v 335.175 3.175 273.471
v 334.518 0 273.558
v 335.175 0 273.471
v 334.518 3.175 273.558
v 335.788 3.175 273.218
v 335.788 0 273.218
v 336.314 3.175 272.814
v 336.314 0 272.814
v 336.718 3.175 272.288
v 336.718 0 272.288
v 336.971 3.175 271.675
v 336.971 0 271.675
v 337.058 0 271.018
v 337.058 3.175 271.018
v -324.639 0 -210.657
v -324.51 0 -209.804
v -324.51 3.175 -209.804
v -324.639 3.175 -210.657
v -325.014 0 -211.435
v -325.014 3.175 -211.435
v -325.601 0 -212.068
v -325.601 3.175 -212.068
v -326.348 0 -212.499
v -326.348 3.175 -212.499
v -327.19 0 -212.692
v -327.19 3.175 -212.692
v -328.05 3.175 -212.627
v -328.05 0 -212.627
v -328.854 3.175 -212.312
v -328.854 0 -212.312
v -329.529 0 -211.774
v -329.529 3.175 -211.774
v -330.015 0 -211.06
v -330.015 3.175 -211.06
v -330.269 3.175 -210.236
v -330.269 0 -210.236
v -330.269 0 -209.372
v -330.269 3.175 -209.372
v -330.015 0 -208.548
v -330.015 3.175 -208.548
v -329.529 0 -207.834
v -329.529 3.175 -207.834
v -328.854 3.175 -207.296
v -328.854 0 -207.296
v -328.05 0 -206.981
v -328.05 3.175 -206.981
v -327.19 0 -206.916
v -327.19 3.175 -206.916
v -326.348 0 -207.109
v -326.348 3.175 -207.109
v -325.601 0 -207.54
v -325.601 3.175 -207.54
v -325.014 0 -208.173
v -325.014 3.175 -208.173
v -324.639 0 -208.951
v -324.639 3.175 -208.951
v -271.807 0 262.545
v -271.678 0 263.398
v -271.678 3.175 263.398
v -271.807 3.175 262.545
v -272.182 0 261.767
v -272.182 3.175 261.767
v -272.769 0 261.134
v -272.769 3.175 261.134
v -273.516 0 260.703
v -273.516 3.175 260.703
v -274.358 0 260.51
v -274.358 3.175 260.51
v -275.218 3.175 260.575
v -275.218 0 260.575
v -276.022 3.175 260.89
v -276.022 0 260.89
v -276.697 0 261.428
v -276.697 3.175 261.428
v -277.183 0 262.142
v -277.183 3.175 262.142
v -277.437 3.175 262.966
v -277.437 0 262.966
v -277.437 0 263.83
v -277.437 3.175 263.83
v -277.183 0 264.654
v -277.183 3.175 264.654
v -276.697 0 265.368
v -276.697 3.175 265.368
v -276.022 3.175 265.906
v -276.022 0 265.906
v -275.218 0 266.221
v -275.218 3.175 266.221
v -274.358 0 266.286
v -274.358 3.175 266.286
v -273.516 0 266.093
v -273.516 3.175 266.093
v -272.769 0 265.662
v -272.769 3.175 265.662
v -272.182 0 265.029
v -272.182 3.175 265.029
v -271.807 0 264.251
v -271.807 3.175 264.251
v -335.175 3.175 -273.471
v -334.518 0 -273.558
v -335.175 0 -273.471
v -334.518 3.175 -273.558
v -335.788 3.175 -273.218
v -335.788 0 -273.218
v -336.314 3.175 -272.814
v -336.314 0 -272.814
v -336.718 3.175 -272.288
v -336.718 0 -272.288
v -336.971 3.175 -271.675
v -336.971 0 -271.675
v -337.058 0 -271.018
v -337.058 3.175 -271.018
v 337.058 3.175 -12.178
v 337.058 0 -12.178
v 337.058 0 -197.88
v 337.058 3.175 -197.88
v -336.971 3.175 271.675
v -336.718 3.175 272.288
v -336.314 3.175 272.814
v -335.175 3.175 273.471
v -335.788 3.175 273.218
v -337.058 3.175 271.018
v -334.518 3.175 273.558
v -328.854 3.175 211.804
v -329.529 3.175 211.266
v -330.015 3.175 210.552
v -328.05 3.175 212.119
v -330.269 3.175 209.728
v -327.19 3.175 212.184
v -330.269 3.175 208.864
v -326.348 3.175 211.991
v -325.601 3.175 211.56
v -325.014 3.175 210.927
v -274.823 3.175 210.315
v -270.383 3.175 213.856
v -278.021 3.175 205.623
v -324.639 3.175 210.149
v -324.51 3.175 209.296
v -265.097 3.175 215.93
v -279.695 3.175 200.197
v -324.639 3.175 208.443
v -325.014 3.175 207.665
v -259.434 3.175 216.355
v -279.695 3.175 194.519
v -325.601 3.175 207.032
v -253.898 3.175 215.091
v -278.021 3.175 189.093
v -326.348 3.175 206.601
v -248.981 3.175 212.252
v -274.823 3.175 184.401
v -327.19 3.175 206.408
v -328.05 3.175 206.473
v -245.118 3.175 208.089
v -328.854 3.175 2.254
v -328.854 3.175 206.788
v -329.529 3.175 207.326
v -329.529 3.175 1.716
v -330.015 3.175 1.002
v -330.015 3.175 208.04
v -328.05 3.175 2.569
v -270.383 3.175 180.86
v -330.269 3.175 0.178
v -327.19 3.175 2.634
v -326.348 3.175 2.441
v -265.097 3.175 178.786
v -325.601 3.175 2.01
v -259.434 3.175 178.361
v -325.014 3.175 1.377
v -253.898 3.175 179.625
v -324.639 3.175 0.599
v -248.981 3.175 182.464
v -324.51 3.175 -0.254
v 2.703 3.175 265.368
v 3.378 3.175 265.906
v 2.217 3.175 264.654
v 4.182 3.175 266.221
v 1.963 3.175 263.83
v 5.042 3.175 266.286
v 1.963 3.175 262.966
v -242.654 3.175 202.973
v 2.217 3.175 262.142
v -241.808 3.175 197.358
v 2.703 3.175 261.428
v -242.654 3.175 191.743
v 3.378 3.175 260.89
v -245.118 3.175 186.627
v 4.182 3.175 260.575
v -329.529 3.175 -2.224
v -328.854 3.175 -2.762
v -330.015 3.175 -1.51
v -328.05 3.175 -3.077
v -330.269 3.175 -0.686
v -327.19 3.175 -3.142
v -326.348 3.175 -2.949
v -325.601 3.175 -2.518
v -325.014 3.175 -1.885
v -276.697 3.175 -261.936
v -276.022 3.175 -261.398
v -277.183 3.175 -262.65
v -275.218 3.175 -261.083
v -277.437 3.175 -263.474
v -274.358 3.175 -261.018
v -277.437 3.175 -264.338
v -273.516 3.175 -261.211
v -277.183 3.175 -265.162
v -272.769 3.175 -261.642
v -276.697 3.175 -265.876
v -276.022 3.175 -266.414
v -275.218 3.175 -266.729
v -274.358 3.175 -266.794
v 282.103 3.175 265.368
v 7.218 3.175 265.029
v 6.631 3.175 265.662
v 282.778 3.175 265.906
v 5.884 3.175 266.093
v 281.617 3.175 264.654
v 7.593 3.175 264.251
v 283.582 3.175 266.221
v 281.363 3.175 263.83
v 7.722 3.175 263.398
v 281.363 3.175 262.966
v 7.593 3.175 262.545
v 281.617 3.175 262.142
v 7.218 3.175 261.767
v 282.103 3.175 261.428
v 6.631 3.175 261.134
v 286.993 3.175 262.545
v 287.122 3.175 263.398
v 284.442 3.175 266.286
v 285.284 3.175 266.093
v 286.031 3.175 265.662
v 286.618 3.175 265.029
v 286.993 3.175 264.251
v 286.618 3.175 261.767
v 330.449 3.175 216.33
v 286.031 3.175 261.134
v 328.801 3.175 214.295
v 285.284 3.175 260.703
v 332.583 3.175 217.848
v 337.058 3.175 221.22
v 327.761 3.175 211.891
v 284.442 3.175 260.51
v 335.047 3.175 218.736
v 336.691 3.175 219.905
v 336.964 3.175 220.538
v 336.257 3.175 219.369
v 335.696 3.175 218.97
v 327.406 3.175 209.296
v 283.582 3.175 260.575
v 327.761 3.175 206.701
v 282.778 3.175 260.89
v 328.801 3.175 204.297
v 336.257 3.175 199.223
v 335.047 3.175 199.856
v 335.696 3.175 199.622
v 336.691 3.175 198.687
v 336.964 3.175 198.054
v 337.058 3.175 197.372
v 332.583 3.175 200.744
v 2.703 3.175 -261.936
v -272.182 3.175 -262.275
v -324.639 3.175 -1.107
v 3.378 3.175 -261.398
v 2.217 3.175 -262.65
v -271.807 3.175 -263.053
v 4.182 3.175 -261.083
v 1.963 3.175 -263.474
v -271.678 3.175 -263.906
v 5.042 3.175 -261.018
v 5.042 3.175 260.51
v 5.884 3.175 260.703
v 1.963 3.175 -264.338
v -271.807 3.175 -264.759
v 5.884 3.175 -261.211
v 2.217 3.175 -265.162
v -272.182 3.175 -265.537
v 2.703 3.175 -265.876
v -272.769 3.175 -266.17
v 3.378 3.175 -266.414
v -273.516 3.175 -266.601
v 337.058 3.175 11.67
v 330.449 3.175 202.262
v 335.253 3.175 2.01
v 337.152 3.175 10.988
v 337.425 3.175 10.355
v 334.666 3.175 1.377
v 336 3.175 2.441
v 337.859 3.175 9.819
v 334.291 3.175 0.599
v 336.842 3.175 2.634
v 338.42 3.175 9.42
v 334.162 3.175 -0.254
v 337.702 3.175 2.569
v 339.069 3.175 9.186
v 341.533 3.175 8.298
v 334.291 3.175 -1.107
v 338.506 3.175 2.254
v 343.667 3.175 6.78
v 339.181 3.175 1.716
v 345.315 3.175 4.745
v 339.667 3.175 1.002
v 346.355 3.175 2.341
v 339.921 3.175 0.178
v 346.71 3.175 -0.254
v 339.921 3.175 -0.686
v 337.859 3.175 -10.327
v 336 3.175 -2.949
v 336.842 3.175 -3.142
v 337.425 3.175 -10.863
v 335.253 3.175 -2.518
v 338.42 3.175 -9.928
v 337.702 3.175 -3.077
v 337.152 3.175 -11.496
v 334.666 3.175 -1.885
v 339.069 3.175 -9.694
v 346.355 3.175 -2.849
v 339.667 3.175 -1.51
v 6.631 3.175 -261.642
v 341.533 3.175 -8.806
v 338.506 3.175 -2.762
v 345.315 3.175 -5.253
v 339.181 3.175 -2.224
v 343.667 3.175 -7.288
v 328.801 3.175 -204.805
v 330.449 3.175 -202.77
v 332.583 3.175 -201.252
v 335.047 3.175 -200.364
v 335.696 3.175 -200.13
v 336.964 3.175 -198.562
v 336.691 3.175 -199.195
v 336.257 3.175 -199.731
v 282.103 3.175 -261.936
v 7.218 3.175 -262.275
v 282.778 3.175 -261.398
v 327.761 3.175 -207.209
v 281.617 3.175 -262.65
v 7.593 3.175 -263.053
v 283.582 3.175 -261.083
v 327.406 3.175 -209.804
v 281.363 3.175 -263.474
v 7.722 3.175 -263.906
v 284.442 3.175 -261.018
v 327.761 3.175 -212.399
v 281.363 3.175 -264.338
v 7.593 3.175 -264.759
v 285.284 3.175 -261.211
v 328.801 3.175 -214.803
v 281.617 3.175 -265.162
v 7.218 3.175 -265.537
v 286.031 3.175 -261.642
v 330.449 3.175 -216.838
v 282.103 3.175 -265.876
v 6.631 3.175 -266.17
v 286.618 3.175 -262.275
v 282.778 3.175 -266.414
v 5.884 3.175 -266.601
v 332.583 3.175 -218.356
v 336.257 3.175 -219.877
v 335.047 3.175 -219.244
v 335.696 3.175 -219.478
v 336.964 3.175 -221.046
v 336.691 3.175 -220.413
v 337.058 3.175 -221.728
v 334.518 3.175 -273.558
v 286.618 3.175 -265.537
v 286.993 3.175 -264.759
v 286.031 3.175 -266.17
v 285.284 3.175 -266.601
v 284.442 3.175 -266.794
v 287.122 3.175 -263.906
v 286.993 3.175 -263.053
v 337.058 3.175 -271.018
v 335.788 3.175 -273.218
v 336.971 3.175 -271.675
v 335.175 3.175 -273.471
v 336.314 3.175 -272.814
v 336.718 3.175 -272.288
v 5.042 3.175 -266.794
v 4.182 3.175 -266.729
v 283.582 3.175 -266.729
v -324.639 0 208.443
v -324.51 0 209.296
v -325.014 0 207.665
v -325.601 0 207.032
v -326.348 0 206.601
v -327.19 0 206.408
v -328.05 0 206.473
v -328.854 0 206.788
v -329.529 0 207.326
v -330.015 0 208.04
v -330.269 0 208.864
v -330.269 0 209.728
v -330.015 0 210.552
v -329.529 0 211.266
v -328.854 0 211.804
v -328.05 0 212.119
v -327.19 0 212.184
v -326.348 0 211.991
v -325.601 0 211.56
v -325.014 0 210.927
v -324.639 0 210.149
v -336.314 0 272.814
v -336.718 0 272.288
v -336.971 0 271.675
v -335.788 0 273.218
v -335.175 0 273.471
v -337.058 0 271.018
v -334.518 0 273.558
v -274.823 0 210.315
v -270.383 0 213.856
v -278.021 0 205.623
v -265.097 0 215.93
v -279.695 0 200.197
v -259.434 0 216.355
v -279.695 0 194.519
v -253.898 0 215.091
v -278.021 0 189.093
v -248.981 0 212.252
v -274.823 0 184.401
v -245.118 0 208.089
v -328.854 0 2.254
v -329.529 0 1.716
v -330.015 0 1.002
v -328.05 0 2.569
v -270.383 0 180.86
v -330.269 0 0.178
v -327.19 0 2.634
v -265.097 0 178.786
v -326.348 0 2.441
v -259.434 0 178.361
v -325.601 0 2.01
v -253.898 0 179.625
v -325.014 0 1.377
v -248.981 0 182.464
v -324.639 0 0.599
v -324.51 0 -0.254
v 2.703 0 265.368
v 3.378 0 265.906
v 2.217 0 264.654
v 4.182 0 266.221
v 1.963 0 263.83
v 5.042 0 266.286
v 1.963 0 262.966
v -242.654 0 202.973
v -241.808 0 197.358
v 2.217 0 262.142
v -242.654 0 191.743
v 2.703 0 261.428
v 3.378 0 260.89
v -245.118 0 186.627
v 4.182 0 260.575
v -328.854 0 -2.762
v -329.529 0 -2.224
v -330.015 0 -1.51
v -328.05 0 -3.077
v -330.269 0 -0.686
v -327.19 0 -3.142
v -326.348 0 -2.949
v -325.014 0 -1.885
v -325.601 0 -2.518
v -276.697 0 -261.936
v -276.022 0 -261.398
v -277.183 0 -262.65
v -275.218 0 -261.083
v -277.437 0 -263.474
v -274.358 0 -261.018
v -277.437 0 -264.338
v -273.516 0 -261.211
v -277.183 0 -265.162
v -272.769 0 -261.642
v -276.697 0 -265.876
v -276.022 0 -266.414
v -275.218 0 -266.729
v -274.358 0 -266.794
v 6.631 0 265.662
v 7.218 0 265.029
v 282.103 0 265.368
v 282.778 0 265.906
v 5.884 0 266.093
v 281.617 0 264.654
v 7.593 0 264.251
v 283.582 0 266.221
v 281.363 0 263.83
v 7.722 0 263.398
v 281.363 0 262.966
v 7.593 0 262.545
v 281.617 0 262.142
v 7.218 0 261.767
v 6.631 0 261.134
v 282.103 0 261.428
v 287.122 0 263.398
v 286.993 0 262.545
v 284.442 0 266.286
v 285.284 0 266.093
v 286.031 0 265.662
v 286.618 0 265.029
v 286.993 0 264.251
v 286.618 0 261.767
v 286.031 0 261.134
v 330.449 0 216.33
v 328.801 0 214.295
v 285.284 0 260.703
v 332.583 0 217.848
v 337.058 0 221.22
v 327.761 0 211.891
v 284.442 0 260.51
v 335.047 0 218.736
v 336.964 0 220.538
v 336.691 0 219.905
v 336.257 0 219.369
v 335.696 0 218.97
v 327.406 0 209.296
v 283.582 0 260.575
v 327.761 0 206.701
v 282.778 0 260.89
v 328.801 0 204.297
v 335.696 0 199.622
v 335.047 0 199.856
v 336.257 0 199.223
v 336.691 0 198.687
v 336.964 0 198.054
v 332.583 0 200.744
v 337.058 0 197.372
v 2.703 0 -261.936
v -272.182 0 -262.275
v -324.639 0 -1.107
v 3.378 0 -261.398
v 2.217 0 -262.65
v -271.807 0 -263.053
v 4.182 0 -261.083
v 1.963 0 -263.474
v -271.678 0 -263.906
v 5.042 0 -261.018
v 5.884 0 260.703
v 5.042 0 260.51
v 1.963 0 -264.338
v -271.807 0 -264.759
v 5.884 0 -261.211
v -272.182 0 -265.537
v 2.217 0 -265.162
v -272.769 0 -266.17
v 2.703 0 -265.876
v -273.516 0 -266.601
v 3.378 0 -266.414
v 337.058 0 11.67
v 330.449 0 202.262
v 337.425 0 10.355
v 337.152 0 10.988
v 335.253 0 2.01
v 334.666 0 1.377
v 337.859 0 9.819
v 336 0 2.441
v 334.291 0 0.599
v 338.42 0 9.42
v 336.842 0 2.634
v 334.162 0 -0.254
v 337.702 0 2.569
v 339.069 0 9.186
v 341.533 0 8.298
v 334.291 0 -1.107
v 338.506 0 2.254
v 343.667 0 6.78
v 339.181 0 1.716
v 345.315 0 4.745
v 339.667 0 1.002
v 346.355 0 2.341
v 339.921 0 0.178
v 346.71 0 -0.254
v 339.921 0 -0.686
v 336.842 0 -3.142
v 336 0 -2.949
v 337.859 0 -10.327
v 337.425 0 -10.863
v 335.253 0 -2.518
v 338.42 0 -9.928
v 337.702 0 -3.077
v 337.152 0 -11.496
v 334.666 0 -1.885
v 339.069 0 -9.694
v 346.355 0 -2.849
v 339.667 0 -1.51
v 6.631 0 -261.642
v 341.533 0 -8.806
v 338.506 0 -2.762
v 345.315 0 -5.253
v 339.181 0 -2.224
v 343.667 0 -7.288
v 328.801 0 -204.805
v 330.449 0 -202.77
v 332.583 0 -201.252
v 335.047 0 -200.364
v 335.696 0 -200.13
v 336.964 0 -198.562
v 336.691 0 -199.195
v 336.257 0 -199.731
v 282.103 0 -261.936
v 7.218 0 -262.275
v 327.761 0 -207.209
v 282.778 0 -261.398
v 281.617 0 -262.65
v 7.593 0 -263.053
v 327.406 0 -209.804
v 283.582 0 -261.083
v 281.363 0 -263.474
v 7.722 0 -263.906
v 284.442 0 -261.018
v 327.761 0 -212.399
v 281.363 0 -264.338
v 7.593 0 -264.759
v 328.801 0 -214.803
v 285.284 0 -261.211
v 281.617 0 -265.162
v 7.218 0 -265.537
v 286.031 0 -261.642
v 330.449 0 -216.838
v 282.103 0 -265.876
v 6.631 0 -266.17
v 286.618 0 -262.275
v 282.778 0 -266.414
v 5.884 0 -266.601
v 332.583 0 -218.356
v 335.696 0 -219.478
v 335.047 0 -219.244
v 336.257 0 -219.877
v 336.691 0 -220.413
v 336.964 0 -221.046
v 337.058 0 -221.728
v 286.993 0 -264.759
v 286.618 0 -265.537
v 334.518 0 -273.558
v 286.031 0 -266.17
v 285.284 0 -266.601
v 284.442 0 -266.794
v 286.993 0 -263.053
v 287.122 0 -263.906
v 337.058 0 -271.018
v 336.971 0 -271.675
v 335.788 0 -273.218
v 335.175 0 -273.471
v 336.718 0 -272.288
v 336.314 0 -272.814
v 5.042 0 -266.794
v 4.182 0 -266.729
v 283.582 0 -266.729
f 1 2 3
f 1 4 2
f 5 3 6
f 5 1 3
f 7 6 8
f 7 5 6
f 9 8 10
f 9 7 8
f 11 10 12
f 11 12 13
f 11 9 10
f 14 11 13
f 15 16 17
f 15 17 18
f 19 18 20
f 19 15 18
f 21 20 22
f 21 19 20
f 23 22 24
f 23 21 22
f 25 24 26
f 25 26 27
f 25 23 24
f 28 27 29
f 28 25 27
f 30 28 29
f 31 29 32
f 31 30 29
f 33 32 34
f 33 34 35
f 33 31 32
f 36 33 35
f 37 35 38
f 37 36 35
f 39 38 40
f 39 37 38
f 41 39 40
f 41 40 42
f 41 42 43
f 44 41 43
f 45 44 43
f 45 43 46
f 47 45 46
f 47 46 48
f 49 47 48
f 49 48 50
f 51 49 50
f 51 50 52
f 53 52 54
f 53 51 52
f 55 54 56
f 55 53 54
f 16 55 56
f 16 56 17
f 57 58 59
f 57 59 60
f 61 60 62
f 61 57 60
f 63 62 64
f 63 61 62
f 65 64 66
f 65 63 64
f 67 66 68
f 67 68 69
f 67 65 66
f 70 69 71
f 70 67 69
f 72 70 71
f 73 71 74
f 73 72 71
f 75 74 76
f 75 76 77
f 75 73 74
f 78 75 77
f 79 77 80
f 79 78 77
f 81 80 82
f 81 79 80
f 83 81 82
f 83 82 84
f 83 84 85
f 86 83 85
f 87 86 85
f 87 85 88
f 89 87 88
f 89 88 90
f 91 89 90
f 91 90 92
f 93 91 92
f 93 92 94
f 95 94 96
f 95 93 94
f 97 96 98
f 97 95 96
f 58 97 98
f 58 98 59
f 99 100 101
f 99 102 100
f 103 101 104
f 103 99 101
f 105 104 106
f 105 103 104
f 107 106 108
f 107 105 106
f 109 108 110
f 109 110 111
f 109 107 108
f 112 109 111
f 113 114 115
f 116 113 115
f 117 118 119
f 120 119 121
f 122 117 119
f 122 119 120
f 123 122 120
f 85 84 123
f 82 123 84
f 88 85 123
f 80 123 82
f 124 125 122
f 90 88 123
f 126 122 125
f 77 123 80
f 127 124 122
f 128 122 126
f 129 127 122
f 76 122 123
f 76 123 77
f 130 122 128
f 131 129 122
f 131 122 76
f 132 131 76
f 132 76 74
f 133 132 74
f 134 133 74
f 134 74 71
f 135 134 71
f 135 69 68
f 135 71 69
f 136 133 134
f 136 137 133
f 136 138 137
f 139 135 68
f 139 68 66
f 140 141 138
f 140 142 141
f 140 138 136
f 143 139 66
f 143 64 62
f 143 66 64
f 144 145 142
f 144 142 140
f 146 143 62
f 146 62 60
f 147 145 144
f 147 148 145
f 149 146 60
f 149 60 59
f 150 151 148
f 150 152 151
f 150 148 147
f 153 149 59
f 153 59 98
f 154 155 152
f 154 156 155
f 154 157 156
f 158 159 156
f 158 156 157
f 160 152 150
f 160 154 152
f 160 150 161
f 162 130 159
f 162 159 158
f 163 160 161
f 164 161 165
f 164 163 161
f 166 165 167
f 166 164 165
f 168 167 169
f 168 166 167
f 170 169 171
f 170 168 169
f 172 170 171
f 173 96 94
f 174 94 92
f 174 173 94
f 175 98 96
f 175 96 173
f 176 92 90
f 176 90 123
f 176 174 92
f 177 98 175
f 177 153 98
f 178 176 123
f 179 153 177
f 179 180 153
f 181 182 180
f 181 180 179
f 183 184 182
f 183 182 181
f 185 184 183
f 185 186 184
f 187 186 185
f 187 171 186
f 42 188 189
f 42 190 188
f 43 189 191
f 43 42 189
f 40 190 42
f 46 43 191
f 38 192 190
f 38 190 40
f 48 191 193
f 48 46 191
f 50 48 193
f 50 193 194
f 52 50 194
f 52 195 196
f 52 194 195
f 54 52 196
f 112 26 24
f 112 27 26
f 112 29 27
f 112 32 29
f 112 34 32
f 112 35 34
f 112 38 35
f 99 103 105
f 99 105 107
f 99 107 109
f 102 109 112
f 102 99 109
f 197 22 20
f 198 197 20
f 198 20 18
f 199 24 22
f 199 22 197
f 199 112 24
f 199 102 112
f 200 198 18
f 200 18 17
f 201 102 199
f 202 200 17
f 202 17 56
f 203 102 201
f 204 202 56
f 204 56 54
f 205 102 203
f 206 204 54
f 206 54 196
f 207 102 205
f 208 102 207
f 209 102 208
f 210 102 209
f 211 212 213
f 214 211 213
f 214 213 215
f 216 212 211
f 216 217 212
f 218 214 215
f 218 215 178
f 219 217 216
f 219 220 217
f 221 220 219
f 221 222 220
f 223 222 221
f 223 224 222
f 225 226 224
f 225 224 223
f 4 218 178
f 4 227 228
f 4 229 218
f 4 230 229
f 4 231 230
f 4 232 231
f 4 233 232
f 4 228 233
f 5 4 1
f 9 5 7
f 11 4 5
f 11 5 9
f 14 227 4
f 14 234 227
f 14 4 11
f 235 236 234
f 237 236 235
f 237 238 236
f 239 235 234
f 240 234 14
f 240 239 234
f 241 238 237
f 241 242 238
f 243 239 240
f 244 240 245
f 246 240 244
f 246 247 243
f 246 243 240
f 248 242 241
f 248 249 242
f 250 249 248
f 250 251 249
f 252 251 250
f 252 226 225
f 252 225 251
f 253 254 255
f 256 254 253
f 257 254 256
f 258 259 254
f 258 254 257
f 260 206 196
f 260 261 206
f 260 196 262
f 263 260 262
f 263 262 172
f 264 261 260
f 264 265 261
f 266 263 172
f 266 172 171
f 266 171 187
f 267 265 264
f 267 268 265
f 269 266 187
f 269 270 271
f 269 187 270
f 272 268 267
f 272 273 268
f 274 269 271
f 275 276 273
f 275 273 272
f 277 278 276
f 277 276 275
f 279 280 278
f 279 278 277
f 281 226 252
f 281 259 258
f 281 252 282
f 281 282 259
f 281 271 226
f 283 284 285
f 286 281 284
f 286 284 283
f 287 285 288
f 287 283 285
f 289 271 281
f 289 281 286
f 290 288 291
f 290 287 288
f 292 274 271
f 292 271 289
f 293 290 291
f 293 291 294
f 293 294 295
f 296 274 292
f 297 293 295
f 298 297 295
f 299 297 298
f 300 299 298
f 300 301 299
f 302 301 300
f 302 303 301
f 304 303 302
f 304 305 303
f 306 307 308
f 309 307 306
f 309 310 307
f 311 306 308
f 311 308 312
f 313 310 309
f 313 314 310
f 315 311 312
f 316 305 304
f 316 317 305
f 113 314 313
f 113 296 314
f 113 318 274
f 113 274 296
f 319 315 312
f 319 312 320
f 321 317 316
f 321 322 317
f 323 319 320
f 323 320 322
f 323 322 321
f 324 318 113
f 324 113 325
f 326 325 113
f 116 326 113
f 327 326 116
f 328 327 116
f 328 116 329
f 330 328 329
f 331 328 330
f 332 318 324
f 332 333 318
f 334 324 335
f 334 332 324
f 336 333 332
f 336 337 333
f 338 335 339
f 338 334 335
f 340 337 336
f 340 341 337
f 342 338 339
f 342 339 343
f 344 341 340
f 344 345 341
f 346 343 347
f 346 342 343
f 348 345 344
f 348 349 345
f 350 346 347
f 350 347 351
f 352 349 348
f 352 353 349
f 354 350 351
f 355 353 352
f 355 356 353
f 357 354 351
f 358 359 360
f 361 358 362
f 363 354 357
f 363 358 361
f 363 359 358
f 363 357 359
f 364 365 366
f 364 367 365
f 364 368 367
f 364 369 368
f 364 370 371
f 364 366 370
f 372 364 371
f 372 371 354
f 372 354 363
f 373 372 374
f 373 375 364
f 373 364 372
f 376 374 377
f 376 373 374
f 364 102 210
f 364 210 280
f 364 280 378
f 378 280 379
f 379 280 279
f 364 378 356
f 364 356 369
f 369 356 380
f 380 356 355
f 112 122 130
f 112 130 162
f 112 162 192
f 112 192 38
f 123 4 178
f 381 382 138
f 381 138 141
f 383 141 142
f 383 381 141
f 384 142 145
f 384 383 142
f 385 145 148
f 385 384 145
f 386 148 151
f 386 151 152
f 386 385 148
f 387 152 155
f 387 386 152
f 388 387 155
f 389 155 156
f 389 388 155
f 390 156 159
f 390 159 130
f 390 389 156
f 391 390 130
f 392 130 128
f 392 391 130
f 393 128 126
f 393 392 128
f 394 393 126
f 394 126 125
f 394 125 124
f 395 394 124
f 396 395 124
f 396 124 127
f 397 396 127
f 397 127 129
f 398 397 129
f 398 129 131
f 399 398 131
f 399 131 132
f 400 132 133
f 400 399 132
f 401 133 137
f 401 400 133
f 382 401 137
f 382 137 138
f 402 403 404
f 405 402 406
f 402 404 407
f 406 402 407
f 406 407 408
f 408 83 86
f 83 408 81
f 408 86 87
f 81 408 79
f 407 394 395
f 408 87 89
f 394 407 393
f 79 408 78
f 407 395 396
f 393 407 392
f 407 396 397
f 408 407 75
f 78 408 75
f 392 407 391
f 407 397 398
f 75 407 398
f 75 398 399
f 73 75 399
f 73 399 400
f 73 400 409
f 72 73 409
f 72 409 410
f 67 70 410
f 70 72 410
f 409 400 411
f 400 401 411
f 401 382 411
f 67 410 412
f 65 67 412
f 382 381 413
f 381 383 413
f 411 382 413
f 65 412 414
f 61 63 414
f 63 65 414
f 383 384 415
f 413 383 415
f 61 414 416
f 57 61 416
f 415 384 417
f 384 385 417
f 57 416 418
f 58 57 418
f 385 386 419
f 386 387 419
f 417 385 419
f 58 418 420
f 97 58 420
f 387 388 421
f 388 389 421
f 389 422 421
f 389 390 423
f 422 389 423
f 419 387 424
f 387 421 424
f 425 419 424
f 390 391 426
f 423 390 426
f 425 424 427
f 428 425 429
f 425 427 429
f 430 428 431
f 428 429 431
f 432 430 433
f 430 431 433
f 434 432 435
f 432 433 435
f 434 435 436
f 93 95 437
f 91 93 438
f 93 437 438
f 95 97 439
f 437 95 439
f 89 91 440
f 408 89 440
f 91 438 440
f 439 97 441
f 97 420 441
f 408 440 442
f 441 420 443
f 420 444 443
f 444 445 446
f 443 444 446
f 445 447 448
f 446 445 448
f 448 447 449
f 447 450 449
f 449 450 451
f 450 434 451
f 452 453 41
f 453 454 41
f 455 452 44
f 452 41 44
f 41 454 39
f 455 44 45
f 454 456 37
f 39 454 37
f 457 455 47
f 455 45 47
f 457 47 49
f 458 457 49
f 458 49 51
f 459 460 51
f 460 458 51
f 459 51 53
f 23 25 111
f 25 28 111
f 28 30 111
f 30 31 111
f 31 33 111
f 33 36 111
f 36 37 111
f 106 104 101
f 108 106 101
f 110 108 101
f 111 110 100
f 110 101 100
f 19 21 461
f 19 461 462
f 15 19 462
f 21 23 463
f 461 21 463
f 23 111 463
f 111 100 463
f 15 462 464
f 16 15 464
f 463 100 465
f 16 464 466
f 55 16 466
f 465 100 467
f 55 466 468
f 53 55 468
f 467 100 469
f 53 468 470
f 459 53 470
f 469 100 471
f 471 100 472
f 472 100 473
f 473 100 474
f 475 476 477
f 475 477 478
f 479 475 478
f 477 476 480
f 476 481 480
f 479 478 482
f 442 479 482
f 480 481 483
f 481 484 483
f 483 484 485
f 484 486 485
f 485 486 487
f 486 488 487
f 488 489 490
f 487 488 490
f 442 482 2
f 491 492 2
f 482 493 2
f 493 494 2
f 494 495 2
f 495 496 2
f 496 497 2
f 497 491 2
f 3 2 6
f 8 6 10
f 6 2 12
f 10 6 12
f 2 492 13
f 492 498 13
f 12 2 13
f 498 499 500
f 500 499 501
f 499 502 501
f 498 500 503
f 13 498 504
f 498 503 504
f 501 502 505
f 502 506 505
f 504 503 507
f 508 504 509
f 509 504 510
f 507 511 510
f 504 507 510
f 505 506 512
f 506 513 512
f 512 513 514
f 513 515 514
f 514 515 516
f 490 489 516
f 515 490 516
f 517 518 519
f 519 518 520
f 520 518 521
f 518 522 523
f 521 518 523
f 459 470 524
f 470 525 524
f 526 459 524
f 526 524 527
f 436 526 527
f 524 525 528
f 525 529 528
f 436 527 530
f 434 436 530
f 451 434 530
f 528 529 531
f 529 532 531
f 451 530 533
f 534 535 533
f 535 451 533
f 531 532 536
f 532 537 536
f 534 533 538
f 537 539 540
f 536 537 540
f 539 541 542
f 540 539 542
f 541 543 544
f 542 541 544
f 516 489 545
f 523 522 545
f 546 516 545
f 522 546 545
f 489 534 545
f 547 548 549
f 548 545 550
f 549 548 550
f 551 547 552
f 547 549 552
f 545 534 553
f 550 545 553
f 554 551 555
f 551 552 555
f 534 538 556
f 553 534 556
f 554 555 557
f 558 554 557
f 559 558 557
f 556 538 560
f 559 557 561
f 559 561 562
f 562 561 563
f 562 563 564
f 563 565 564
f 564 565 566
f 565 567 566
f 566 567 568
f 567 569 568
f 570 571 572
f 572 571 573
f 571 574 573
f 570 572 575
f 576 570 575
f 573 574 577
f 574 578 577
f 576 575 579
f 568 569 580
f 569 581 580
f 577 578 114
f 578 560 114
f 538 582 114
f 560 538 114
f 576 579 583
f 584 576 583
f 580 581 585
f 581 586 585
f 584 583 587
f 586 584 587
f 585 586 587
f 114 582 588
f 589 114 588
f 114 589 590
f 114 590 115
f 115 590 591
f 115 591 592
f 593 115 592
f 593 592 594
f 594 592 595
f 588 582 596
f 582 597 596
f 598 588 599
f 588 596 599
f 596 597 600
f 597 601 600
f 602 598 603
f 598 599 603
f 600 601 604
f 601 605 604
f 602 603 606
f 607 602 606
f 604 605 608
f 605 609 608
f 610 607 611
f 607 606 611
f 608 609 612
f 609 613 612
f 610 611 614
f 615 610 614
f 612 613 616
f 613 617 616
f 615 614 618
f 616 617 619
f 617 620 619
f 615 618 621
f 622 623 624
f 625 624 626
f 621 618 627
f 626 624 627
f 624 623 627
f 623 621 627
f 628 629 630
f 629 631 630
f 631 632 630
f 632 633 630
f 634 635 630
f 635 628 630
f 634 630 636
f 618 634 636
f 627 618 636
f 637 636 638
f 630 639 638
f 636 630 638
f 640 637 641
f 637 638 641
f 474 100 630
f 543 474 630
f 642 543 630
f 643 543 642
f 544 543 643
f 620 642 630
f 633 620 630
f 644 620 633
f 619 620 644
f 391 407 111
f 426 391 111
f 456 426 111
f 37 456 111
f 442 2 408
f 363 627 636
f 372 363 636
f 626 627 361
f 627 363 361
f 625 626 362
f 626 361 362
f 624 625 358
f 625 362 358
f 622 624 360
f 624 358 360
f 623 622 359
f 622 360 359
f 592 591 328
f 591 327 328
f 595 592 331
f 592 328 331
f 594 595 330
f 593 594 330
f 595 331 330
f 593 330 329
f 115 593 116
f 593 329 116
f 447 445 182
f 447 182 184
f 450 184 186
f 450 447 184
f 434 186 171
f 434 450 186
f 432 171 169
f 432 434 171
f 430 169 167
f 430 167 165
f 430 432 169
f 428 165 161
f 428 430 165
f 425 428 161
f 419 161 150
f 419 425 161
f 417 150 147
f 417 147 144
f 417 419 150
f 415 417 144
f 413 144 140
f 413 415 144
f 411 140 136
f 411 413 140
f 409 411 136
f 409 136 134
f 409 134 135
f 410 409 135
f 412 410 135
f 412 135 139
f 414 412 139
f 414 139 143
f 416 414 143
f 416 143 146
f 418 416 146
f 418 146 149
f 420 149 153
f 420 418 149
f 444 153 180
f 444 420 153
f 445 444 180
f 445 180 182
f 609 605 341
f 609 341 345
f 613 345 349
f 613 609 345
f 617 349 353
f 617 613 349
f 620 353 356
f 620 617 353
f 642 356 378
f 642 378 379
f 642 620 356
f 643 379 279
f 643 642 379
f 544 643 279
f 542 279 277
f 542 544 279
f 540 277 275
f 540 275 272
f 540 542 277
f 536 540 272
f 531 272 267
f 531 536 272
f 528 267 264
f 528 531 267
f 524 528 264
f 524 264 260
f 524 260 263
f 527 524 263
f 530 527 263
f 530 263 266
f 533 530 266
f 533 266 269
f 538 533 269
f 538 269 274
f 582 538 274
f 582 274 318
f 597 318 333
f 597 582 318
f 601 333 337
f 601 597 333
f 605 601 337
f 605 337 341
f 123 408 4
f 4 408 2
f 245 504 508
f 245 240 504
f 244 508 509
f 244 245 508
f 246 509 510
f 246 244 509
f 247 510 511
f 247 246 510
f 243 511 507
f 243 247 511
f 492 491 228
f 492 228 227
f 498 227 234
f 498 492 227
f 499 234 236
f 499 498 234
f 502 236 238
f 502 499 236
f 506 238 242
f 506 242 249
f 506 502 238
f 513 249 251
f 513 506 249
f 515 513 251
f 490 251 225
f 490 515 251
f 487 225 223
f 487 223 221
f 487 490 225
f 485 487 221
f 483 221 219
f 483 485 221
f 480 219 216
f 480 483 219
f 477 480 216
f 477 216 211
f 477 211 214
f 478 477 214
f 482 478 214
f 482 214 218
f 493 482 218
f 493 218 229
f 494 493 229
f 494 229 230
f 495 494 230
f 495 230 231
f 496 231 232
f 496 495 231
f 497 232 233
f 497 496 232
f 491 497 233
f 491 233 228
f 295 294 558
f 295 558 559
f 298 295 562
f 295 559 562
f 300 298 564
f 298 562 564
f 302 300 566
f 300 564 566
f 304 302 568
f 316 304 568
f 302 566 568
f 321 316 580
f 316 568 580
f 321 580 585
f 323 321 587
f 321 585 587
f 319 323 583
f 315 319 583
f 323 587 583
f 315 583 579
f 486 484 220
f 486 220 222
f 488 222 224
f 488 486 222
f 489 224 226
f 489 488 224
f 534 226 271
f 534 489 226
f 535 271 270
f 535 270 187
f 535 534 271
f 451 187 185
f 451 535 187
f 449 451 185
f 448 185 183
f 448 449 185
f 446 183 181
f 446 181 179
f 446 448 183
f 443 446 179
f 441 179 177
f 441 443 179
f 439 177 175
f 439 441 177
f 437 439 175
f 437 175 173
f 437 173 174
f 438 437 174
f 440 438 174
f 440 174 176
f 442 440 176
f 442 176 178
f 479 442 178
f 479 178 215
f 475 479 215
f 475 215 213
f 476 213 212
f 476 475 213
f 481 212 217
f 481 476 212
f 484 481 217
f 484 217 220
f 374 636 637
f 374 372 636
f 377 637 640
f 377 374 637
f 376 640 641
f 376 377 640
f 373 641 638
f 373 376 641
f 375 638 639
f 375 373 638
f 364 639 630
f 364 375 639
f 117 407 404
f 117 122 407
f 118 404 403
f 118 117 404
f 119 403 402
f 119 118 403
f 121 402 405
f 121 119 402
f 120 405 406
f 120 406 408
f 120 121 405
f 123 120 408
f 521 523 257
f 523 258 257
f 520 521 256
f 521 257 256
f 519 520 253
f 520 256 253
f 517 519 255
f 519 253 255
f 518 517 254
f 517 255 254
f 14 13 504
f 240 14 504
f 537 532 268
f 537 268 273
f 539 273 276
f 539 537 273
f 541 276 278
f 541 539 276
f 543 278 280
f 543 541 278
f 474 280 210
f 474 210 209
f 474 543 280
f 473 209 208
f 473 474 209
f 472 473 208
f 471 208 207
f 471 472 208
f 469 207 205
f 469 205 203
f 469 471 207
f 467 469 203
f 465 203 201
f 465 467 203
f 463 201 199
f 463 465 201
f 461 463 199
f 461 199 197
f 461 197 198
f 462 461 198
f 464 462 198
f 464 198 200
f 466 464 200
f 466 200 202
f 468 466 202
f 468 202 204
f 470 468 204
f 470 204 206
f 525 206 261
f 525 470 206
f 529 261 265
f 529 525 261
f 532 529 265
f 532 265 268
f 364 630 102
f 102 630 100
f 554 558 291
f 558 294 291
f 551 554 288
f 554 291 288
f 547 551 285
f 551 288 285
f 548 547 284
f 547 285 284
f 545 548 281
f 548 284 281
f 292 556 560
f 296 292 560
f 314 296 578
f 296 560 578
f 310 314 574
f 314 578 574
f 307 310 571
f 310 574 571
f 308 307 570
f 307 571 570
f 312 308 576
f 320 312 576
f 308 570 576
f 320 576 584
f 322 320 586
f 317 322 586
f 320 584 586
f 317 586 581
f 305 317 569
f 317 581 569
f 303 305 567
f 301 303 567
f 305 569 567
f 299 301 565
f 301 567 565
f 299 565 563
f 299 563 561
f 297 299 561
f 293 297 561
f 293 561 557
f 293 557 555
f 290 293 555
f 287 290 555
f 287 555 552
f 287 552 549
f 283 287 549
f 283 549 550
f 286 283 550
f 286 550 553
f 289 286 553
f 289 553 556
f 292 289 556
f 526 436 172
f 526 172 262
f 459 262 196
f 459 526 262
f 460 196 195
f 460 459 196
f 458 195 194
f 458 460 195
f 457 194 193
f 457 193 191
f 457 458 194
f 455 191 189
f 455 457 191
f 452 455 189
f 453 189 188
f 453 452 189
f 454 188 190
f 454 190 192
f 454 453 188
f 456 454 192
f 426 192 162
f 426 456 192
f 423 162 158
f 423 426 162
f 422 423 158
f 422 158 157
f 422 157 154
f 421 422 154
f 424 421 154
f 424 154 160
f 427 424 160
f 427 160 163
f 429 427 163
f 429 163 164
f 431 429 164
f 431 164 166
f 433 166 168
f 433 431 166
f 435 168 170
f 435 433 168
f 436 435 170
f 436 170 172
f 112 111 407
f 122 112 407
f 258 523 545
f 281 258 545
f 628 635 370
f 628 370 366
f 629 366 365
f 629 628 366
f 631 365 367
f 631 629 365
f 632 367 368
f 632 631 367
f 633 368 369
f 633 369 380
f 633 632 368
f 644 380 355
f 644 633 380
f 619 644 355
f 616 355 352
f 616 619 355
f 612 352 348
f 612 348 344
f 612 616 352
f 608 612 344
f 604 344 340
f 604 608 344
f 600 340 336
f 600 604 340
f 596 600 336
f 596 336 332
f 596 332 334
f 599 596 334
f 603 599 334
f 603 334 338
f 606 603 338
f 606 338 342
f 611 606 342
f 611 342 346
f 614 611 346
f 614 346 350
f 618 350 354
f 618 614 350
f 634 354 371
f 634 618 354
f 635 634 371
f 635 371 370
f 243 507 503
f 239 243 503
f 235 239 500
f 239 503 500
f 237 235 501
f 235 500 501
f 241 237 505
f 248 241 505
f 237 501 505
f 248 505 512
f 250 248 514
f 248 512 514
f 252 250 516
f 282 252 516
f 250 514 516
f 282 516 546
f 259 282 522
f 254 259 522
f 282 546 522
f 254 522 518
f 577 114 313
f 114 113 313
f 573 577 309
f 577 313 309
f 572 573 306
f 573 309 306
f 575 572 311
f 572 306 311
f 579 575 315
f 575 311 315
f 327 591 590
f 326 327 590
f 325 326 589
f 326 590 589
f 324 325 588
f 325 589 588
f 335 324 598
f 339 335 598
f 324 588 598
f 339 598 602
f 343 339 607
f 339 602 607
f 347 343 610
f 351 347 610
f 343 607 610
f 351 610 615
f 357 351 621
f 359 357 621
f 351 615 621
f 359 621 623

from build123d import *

# Parameters (mm, degrees)
BOSS_EXTRUDE1_DEPTH        = 3.175
F_1_0_228_DIAMETER_HOLE2_D = 5.7912
FILLET2_R                  = 2.54
CUT_EXTRUDE3_OUTLINE_R     = 2.8956
CUT_EXTRUDE3_OUTLINE_R_2   = 19.05
CUT_EXTRUDE3_DEPTH         = 3.175


# Read off the part's stored shape, not the designer's step: Cut-Extrude3
with BuildPart() as part:
    # Sketch1 → Boss-Extrude1 (new body)
    with BuildSketch(Plane(origin=(0, 0, 0), x_dir=(1, 0, 0), z_dir=(0, 1, 0))):
        with BuildLine():
            Line((337.058, 219.456), (337.058, 273.558))
            Line((337.058, 273.558), (-337.058, 273.558))
            Line((-337.058, 273.558), (-337.058, -273.558))
            Line((-337.058, -273.558), (337.058, -273.558))
            Line((337.058, -273.558), (337.058, -218.948))
            ThreePointArc((337.058, -218.948), (327.406, -209.296), (337.058, -199.644))
            Line((337.058, -199.644), (337.058, -9.398))
            ThreePointArc((337.058, -9.398), (346.71, 0.254), (337.058, 9.906))
            Line((337.058, 9.906), (337.058, 200.152))
            ThreePointArc((337.058, 200.152), (327.406, 209.804), (337.058, 219.456))
        make_face()
    extrude(amount=BOSS_EXTRUDE1_DEPTH)

    # #1 (0.228) Diameter Hole2 (through all)
    with Locations(Plane(origin=(0, 3.175, 0), x_dir=(1, 0, 0), z_dir=(0, 1, 0))):
        with Locations((337.058, 0.254)):
            Hole(F_1_0_228_DIAMETER_HOLE2_D / 2)

    # Fillet2
    fillet2_edges = [part.edges().sort_by_distance(p)[0] for p in [
        (337.058, 1.5875, -273.558),
        (337.058, 1.5875, -219.456),
        (337.058, 1.5875, -200.152),
        (337.058, 1.5875, -9.906),
        (337.058, 1.5875, 9.398),
        (337.058, 1.5875, 199.644),
        (337.058, 1.5875, 218.948),
        (337.058, 1.5875, 273.558),
        (-337.058, 1.5875, 273.558),
        (-337.058, 1.5875, -273.558),
    ]]
    fillet(fillet2_edges, radius=FILLET2_R)

    # Cut-Extrude3 outline → Cut-Extrude3 (cut)
    with BuildSketch(Plane(origin=(0, 0, 0), x_dir=(1, 0, 0), z_dir=(0, 1, 0))):
        with Locations((284.226, -263.398)):
            Circle(CUT_EXTRUDE3_OUTLINE_R)
        with Locations((4.826, -263.398)):
            Circle(CUT_EXTRUDE3_OUTLINE_R)
        with Locations((-274.574, -263.398)):
            Circle(CUT_EXTRUDE3_OUTLINE_R)
        with Locations((-327.406, -209.296)):
            Circle(CUT_EXTRUDE3_OUTLINE_R)
        with Locations((-327.406, 0.254)):
            Circle(CUT_EXTRUDE3_OUTLINE_R)
        with Locations((-327.406, 209.804)):
            Circle(CUT_EXTRUDE3_OUTLINE_R)
        with Locations((-274.574, 263.906)):
            Circle(CUT_EXTRUDE3_OUTLINE_R)
        with Locations((4.826, 263.906)):
            Circle(CUT_EXTRUDE3_OUTLINE_R)
        with Locations((284.226, 263.906)):
            Circle(CUT_EXTRUDE3_OUTLINE_R)
        with Locations((-260.858, -197.358)):
            Circle(CUT_EXTRUDE3_OUTLINE_R_2)
    extrude(amount=CUT_EXTRUDE3_DEPTH, mode=Mode.SUBTRACT)


solid = part.part
